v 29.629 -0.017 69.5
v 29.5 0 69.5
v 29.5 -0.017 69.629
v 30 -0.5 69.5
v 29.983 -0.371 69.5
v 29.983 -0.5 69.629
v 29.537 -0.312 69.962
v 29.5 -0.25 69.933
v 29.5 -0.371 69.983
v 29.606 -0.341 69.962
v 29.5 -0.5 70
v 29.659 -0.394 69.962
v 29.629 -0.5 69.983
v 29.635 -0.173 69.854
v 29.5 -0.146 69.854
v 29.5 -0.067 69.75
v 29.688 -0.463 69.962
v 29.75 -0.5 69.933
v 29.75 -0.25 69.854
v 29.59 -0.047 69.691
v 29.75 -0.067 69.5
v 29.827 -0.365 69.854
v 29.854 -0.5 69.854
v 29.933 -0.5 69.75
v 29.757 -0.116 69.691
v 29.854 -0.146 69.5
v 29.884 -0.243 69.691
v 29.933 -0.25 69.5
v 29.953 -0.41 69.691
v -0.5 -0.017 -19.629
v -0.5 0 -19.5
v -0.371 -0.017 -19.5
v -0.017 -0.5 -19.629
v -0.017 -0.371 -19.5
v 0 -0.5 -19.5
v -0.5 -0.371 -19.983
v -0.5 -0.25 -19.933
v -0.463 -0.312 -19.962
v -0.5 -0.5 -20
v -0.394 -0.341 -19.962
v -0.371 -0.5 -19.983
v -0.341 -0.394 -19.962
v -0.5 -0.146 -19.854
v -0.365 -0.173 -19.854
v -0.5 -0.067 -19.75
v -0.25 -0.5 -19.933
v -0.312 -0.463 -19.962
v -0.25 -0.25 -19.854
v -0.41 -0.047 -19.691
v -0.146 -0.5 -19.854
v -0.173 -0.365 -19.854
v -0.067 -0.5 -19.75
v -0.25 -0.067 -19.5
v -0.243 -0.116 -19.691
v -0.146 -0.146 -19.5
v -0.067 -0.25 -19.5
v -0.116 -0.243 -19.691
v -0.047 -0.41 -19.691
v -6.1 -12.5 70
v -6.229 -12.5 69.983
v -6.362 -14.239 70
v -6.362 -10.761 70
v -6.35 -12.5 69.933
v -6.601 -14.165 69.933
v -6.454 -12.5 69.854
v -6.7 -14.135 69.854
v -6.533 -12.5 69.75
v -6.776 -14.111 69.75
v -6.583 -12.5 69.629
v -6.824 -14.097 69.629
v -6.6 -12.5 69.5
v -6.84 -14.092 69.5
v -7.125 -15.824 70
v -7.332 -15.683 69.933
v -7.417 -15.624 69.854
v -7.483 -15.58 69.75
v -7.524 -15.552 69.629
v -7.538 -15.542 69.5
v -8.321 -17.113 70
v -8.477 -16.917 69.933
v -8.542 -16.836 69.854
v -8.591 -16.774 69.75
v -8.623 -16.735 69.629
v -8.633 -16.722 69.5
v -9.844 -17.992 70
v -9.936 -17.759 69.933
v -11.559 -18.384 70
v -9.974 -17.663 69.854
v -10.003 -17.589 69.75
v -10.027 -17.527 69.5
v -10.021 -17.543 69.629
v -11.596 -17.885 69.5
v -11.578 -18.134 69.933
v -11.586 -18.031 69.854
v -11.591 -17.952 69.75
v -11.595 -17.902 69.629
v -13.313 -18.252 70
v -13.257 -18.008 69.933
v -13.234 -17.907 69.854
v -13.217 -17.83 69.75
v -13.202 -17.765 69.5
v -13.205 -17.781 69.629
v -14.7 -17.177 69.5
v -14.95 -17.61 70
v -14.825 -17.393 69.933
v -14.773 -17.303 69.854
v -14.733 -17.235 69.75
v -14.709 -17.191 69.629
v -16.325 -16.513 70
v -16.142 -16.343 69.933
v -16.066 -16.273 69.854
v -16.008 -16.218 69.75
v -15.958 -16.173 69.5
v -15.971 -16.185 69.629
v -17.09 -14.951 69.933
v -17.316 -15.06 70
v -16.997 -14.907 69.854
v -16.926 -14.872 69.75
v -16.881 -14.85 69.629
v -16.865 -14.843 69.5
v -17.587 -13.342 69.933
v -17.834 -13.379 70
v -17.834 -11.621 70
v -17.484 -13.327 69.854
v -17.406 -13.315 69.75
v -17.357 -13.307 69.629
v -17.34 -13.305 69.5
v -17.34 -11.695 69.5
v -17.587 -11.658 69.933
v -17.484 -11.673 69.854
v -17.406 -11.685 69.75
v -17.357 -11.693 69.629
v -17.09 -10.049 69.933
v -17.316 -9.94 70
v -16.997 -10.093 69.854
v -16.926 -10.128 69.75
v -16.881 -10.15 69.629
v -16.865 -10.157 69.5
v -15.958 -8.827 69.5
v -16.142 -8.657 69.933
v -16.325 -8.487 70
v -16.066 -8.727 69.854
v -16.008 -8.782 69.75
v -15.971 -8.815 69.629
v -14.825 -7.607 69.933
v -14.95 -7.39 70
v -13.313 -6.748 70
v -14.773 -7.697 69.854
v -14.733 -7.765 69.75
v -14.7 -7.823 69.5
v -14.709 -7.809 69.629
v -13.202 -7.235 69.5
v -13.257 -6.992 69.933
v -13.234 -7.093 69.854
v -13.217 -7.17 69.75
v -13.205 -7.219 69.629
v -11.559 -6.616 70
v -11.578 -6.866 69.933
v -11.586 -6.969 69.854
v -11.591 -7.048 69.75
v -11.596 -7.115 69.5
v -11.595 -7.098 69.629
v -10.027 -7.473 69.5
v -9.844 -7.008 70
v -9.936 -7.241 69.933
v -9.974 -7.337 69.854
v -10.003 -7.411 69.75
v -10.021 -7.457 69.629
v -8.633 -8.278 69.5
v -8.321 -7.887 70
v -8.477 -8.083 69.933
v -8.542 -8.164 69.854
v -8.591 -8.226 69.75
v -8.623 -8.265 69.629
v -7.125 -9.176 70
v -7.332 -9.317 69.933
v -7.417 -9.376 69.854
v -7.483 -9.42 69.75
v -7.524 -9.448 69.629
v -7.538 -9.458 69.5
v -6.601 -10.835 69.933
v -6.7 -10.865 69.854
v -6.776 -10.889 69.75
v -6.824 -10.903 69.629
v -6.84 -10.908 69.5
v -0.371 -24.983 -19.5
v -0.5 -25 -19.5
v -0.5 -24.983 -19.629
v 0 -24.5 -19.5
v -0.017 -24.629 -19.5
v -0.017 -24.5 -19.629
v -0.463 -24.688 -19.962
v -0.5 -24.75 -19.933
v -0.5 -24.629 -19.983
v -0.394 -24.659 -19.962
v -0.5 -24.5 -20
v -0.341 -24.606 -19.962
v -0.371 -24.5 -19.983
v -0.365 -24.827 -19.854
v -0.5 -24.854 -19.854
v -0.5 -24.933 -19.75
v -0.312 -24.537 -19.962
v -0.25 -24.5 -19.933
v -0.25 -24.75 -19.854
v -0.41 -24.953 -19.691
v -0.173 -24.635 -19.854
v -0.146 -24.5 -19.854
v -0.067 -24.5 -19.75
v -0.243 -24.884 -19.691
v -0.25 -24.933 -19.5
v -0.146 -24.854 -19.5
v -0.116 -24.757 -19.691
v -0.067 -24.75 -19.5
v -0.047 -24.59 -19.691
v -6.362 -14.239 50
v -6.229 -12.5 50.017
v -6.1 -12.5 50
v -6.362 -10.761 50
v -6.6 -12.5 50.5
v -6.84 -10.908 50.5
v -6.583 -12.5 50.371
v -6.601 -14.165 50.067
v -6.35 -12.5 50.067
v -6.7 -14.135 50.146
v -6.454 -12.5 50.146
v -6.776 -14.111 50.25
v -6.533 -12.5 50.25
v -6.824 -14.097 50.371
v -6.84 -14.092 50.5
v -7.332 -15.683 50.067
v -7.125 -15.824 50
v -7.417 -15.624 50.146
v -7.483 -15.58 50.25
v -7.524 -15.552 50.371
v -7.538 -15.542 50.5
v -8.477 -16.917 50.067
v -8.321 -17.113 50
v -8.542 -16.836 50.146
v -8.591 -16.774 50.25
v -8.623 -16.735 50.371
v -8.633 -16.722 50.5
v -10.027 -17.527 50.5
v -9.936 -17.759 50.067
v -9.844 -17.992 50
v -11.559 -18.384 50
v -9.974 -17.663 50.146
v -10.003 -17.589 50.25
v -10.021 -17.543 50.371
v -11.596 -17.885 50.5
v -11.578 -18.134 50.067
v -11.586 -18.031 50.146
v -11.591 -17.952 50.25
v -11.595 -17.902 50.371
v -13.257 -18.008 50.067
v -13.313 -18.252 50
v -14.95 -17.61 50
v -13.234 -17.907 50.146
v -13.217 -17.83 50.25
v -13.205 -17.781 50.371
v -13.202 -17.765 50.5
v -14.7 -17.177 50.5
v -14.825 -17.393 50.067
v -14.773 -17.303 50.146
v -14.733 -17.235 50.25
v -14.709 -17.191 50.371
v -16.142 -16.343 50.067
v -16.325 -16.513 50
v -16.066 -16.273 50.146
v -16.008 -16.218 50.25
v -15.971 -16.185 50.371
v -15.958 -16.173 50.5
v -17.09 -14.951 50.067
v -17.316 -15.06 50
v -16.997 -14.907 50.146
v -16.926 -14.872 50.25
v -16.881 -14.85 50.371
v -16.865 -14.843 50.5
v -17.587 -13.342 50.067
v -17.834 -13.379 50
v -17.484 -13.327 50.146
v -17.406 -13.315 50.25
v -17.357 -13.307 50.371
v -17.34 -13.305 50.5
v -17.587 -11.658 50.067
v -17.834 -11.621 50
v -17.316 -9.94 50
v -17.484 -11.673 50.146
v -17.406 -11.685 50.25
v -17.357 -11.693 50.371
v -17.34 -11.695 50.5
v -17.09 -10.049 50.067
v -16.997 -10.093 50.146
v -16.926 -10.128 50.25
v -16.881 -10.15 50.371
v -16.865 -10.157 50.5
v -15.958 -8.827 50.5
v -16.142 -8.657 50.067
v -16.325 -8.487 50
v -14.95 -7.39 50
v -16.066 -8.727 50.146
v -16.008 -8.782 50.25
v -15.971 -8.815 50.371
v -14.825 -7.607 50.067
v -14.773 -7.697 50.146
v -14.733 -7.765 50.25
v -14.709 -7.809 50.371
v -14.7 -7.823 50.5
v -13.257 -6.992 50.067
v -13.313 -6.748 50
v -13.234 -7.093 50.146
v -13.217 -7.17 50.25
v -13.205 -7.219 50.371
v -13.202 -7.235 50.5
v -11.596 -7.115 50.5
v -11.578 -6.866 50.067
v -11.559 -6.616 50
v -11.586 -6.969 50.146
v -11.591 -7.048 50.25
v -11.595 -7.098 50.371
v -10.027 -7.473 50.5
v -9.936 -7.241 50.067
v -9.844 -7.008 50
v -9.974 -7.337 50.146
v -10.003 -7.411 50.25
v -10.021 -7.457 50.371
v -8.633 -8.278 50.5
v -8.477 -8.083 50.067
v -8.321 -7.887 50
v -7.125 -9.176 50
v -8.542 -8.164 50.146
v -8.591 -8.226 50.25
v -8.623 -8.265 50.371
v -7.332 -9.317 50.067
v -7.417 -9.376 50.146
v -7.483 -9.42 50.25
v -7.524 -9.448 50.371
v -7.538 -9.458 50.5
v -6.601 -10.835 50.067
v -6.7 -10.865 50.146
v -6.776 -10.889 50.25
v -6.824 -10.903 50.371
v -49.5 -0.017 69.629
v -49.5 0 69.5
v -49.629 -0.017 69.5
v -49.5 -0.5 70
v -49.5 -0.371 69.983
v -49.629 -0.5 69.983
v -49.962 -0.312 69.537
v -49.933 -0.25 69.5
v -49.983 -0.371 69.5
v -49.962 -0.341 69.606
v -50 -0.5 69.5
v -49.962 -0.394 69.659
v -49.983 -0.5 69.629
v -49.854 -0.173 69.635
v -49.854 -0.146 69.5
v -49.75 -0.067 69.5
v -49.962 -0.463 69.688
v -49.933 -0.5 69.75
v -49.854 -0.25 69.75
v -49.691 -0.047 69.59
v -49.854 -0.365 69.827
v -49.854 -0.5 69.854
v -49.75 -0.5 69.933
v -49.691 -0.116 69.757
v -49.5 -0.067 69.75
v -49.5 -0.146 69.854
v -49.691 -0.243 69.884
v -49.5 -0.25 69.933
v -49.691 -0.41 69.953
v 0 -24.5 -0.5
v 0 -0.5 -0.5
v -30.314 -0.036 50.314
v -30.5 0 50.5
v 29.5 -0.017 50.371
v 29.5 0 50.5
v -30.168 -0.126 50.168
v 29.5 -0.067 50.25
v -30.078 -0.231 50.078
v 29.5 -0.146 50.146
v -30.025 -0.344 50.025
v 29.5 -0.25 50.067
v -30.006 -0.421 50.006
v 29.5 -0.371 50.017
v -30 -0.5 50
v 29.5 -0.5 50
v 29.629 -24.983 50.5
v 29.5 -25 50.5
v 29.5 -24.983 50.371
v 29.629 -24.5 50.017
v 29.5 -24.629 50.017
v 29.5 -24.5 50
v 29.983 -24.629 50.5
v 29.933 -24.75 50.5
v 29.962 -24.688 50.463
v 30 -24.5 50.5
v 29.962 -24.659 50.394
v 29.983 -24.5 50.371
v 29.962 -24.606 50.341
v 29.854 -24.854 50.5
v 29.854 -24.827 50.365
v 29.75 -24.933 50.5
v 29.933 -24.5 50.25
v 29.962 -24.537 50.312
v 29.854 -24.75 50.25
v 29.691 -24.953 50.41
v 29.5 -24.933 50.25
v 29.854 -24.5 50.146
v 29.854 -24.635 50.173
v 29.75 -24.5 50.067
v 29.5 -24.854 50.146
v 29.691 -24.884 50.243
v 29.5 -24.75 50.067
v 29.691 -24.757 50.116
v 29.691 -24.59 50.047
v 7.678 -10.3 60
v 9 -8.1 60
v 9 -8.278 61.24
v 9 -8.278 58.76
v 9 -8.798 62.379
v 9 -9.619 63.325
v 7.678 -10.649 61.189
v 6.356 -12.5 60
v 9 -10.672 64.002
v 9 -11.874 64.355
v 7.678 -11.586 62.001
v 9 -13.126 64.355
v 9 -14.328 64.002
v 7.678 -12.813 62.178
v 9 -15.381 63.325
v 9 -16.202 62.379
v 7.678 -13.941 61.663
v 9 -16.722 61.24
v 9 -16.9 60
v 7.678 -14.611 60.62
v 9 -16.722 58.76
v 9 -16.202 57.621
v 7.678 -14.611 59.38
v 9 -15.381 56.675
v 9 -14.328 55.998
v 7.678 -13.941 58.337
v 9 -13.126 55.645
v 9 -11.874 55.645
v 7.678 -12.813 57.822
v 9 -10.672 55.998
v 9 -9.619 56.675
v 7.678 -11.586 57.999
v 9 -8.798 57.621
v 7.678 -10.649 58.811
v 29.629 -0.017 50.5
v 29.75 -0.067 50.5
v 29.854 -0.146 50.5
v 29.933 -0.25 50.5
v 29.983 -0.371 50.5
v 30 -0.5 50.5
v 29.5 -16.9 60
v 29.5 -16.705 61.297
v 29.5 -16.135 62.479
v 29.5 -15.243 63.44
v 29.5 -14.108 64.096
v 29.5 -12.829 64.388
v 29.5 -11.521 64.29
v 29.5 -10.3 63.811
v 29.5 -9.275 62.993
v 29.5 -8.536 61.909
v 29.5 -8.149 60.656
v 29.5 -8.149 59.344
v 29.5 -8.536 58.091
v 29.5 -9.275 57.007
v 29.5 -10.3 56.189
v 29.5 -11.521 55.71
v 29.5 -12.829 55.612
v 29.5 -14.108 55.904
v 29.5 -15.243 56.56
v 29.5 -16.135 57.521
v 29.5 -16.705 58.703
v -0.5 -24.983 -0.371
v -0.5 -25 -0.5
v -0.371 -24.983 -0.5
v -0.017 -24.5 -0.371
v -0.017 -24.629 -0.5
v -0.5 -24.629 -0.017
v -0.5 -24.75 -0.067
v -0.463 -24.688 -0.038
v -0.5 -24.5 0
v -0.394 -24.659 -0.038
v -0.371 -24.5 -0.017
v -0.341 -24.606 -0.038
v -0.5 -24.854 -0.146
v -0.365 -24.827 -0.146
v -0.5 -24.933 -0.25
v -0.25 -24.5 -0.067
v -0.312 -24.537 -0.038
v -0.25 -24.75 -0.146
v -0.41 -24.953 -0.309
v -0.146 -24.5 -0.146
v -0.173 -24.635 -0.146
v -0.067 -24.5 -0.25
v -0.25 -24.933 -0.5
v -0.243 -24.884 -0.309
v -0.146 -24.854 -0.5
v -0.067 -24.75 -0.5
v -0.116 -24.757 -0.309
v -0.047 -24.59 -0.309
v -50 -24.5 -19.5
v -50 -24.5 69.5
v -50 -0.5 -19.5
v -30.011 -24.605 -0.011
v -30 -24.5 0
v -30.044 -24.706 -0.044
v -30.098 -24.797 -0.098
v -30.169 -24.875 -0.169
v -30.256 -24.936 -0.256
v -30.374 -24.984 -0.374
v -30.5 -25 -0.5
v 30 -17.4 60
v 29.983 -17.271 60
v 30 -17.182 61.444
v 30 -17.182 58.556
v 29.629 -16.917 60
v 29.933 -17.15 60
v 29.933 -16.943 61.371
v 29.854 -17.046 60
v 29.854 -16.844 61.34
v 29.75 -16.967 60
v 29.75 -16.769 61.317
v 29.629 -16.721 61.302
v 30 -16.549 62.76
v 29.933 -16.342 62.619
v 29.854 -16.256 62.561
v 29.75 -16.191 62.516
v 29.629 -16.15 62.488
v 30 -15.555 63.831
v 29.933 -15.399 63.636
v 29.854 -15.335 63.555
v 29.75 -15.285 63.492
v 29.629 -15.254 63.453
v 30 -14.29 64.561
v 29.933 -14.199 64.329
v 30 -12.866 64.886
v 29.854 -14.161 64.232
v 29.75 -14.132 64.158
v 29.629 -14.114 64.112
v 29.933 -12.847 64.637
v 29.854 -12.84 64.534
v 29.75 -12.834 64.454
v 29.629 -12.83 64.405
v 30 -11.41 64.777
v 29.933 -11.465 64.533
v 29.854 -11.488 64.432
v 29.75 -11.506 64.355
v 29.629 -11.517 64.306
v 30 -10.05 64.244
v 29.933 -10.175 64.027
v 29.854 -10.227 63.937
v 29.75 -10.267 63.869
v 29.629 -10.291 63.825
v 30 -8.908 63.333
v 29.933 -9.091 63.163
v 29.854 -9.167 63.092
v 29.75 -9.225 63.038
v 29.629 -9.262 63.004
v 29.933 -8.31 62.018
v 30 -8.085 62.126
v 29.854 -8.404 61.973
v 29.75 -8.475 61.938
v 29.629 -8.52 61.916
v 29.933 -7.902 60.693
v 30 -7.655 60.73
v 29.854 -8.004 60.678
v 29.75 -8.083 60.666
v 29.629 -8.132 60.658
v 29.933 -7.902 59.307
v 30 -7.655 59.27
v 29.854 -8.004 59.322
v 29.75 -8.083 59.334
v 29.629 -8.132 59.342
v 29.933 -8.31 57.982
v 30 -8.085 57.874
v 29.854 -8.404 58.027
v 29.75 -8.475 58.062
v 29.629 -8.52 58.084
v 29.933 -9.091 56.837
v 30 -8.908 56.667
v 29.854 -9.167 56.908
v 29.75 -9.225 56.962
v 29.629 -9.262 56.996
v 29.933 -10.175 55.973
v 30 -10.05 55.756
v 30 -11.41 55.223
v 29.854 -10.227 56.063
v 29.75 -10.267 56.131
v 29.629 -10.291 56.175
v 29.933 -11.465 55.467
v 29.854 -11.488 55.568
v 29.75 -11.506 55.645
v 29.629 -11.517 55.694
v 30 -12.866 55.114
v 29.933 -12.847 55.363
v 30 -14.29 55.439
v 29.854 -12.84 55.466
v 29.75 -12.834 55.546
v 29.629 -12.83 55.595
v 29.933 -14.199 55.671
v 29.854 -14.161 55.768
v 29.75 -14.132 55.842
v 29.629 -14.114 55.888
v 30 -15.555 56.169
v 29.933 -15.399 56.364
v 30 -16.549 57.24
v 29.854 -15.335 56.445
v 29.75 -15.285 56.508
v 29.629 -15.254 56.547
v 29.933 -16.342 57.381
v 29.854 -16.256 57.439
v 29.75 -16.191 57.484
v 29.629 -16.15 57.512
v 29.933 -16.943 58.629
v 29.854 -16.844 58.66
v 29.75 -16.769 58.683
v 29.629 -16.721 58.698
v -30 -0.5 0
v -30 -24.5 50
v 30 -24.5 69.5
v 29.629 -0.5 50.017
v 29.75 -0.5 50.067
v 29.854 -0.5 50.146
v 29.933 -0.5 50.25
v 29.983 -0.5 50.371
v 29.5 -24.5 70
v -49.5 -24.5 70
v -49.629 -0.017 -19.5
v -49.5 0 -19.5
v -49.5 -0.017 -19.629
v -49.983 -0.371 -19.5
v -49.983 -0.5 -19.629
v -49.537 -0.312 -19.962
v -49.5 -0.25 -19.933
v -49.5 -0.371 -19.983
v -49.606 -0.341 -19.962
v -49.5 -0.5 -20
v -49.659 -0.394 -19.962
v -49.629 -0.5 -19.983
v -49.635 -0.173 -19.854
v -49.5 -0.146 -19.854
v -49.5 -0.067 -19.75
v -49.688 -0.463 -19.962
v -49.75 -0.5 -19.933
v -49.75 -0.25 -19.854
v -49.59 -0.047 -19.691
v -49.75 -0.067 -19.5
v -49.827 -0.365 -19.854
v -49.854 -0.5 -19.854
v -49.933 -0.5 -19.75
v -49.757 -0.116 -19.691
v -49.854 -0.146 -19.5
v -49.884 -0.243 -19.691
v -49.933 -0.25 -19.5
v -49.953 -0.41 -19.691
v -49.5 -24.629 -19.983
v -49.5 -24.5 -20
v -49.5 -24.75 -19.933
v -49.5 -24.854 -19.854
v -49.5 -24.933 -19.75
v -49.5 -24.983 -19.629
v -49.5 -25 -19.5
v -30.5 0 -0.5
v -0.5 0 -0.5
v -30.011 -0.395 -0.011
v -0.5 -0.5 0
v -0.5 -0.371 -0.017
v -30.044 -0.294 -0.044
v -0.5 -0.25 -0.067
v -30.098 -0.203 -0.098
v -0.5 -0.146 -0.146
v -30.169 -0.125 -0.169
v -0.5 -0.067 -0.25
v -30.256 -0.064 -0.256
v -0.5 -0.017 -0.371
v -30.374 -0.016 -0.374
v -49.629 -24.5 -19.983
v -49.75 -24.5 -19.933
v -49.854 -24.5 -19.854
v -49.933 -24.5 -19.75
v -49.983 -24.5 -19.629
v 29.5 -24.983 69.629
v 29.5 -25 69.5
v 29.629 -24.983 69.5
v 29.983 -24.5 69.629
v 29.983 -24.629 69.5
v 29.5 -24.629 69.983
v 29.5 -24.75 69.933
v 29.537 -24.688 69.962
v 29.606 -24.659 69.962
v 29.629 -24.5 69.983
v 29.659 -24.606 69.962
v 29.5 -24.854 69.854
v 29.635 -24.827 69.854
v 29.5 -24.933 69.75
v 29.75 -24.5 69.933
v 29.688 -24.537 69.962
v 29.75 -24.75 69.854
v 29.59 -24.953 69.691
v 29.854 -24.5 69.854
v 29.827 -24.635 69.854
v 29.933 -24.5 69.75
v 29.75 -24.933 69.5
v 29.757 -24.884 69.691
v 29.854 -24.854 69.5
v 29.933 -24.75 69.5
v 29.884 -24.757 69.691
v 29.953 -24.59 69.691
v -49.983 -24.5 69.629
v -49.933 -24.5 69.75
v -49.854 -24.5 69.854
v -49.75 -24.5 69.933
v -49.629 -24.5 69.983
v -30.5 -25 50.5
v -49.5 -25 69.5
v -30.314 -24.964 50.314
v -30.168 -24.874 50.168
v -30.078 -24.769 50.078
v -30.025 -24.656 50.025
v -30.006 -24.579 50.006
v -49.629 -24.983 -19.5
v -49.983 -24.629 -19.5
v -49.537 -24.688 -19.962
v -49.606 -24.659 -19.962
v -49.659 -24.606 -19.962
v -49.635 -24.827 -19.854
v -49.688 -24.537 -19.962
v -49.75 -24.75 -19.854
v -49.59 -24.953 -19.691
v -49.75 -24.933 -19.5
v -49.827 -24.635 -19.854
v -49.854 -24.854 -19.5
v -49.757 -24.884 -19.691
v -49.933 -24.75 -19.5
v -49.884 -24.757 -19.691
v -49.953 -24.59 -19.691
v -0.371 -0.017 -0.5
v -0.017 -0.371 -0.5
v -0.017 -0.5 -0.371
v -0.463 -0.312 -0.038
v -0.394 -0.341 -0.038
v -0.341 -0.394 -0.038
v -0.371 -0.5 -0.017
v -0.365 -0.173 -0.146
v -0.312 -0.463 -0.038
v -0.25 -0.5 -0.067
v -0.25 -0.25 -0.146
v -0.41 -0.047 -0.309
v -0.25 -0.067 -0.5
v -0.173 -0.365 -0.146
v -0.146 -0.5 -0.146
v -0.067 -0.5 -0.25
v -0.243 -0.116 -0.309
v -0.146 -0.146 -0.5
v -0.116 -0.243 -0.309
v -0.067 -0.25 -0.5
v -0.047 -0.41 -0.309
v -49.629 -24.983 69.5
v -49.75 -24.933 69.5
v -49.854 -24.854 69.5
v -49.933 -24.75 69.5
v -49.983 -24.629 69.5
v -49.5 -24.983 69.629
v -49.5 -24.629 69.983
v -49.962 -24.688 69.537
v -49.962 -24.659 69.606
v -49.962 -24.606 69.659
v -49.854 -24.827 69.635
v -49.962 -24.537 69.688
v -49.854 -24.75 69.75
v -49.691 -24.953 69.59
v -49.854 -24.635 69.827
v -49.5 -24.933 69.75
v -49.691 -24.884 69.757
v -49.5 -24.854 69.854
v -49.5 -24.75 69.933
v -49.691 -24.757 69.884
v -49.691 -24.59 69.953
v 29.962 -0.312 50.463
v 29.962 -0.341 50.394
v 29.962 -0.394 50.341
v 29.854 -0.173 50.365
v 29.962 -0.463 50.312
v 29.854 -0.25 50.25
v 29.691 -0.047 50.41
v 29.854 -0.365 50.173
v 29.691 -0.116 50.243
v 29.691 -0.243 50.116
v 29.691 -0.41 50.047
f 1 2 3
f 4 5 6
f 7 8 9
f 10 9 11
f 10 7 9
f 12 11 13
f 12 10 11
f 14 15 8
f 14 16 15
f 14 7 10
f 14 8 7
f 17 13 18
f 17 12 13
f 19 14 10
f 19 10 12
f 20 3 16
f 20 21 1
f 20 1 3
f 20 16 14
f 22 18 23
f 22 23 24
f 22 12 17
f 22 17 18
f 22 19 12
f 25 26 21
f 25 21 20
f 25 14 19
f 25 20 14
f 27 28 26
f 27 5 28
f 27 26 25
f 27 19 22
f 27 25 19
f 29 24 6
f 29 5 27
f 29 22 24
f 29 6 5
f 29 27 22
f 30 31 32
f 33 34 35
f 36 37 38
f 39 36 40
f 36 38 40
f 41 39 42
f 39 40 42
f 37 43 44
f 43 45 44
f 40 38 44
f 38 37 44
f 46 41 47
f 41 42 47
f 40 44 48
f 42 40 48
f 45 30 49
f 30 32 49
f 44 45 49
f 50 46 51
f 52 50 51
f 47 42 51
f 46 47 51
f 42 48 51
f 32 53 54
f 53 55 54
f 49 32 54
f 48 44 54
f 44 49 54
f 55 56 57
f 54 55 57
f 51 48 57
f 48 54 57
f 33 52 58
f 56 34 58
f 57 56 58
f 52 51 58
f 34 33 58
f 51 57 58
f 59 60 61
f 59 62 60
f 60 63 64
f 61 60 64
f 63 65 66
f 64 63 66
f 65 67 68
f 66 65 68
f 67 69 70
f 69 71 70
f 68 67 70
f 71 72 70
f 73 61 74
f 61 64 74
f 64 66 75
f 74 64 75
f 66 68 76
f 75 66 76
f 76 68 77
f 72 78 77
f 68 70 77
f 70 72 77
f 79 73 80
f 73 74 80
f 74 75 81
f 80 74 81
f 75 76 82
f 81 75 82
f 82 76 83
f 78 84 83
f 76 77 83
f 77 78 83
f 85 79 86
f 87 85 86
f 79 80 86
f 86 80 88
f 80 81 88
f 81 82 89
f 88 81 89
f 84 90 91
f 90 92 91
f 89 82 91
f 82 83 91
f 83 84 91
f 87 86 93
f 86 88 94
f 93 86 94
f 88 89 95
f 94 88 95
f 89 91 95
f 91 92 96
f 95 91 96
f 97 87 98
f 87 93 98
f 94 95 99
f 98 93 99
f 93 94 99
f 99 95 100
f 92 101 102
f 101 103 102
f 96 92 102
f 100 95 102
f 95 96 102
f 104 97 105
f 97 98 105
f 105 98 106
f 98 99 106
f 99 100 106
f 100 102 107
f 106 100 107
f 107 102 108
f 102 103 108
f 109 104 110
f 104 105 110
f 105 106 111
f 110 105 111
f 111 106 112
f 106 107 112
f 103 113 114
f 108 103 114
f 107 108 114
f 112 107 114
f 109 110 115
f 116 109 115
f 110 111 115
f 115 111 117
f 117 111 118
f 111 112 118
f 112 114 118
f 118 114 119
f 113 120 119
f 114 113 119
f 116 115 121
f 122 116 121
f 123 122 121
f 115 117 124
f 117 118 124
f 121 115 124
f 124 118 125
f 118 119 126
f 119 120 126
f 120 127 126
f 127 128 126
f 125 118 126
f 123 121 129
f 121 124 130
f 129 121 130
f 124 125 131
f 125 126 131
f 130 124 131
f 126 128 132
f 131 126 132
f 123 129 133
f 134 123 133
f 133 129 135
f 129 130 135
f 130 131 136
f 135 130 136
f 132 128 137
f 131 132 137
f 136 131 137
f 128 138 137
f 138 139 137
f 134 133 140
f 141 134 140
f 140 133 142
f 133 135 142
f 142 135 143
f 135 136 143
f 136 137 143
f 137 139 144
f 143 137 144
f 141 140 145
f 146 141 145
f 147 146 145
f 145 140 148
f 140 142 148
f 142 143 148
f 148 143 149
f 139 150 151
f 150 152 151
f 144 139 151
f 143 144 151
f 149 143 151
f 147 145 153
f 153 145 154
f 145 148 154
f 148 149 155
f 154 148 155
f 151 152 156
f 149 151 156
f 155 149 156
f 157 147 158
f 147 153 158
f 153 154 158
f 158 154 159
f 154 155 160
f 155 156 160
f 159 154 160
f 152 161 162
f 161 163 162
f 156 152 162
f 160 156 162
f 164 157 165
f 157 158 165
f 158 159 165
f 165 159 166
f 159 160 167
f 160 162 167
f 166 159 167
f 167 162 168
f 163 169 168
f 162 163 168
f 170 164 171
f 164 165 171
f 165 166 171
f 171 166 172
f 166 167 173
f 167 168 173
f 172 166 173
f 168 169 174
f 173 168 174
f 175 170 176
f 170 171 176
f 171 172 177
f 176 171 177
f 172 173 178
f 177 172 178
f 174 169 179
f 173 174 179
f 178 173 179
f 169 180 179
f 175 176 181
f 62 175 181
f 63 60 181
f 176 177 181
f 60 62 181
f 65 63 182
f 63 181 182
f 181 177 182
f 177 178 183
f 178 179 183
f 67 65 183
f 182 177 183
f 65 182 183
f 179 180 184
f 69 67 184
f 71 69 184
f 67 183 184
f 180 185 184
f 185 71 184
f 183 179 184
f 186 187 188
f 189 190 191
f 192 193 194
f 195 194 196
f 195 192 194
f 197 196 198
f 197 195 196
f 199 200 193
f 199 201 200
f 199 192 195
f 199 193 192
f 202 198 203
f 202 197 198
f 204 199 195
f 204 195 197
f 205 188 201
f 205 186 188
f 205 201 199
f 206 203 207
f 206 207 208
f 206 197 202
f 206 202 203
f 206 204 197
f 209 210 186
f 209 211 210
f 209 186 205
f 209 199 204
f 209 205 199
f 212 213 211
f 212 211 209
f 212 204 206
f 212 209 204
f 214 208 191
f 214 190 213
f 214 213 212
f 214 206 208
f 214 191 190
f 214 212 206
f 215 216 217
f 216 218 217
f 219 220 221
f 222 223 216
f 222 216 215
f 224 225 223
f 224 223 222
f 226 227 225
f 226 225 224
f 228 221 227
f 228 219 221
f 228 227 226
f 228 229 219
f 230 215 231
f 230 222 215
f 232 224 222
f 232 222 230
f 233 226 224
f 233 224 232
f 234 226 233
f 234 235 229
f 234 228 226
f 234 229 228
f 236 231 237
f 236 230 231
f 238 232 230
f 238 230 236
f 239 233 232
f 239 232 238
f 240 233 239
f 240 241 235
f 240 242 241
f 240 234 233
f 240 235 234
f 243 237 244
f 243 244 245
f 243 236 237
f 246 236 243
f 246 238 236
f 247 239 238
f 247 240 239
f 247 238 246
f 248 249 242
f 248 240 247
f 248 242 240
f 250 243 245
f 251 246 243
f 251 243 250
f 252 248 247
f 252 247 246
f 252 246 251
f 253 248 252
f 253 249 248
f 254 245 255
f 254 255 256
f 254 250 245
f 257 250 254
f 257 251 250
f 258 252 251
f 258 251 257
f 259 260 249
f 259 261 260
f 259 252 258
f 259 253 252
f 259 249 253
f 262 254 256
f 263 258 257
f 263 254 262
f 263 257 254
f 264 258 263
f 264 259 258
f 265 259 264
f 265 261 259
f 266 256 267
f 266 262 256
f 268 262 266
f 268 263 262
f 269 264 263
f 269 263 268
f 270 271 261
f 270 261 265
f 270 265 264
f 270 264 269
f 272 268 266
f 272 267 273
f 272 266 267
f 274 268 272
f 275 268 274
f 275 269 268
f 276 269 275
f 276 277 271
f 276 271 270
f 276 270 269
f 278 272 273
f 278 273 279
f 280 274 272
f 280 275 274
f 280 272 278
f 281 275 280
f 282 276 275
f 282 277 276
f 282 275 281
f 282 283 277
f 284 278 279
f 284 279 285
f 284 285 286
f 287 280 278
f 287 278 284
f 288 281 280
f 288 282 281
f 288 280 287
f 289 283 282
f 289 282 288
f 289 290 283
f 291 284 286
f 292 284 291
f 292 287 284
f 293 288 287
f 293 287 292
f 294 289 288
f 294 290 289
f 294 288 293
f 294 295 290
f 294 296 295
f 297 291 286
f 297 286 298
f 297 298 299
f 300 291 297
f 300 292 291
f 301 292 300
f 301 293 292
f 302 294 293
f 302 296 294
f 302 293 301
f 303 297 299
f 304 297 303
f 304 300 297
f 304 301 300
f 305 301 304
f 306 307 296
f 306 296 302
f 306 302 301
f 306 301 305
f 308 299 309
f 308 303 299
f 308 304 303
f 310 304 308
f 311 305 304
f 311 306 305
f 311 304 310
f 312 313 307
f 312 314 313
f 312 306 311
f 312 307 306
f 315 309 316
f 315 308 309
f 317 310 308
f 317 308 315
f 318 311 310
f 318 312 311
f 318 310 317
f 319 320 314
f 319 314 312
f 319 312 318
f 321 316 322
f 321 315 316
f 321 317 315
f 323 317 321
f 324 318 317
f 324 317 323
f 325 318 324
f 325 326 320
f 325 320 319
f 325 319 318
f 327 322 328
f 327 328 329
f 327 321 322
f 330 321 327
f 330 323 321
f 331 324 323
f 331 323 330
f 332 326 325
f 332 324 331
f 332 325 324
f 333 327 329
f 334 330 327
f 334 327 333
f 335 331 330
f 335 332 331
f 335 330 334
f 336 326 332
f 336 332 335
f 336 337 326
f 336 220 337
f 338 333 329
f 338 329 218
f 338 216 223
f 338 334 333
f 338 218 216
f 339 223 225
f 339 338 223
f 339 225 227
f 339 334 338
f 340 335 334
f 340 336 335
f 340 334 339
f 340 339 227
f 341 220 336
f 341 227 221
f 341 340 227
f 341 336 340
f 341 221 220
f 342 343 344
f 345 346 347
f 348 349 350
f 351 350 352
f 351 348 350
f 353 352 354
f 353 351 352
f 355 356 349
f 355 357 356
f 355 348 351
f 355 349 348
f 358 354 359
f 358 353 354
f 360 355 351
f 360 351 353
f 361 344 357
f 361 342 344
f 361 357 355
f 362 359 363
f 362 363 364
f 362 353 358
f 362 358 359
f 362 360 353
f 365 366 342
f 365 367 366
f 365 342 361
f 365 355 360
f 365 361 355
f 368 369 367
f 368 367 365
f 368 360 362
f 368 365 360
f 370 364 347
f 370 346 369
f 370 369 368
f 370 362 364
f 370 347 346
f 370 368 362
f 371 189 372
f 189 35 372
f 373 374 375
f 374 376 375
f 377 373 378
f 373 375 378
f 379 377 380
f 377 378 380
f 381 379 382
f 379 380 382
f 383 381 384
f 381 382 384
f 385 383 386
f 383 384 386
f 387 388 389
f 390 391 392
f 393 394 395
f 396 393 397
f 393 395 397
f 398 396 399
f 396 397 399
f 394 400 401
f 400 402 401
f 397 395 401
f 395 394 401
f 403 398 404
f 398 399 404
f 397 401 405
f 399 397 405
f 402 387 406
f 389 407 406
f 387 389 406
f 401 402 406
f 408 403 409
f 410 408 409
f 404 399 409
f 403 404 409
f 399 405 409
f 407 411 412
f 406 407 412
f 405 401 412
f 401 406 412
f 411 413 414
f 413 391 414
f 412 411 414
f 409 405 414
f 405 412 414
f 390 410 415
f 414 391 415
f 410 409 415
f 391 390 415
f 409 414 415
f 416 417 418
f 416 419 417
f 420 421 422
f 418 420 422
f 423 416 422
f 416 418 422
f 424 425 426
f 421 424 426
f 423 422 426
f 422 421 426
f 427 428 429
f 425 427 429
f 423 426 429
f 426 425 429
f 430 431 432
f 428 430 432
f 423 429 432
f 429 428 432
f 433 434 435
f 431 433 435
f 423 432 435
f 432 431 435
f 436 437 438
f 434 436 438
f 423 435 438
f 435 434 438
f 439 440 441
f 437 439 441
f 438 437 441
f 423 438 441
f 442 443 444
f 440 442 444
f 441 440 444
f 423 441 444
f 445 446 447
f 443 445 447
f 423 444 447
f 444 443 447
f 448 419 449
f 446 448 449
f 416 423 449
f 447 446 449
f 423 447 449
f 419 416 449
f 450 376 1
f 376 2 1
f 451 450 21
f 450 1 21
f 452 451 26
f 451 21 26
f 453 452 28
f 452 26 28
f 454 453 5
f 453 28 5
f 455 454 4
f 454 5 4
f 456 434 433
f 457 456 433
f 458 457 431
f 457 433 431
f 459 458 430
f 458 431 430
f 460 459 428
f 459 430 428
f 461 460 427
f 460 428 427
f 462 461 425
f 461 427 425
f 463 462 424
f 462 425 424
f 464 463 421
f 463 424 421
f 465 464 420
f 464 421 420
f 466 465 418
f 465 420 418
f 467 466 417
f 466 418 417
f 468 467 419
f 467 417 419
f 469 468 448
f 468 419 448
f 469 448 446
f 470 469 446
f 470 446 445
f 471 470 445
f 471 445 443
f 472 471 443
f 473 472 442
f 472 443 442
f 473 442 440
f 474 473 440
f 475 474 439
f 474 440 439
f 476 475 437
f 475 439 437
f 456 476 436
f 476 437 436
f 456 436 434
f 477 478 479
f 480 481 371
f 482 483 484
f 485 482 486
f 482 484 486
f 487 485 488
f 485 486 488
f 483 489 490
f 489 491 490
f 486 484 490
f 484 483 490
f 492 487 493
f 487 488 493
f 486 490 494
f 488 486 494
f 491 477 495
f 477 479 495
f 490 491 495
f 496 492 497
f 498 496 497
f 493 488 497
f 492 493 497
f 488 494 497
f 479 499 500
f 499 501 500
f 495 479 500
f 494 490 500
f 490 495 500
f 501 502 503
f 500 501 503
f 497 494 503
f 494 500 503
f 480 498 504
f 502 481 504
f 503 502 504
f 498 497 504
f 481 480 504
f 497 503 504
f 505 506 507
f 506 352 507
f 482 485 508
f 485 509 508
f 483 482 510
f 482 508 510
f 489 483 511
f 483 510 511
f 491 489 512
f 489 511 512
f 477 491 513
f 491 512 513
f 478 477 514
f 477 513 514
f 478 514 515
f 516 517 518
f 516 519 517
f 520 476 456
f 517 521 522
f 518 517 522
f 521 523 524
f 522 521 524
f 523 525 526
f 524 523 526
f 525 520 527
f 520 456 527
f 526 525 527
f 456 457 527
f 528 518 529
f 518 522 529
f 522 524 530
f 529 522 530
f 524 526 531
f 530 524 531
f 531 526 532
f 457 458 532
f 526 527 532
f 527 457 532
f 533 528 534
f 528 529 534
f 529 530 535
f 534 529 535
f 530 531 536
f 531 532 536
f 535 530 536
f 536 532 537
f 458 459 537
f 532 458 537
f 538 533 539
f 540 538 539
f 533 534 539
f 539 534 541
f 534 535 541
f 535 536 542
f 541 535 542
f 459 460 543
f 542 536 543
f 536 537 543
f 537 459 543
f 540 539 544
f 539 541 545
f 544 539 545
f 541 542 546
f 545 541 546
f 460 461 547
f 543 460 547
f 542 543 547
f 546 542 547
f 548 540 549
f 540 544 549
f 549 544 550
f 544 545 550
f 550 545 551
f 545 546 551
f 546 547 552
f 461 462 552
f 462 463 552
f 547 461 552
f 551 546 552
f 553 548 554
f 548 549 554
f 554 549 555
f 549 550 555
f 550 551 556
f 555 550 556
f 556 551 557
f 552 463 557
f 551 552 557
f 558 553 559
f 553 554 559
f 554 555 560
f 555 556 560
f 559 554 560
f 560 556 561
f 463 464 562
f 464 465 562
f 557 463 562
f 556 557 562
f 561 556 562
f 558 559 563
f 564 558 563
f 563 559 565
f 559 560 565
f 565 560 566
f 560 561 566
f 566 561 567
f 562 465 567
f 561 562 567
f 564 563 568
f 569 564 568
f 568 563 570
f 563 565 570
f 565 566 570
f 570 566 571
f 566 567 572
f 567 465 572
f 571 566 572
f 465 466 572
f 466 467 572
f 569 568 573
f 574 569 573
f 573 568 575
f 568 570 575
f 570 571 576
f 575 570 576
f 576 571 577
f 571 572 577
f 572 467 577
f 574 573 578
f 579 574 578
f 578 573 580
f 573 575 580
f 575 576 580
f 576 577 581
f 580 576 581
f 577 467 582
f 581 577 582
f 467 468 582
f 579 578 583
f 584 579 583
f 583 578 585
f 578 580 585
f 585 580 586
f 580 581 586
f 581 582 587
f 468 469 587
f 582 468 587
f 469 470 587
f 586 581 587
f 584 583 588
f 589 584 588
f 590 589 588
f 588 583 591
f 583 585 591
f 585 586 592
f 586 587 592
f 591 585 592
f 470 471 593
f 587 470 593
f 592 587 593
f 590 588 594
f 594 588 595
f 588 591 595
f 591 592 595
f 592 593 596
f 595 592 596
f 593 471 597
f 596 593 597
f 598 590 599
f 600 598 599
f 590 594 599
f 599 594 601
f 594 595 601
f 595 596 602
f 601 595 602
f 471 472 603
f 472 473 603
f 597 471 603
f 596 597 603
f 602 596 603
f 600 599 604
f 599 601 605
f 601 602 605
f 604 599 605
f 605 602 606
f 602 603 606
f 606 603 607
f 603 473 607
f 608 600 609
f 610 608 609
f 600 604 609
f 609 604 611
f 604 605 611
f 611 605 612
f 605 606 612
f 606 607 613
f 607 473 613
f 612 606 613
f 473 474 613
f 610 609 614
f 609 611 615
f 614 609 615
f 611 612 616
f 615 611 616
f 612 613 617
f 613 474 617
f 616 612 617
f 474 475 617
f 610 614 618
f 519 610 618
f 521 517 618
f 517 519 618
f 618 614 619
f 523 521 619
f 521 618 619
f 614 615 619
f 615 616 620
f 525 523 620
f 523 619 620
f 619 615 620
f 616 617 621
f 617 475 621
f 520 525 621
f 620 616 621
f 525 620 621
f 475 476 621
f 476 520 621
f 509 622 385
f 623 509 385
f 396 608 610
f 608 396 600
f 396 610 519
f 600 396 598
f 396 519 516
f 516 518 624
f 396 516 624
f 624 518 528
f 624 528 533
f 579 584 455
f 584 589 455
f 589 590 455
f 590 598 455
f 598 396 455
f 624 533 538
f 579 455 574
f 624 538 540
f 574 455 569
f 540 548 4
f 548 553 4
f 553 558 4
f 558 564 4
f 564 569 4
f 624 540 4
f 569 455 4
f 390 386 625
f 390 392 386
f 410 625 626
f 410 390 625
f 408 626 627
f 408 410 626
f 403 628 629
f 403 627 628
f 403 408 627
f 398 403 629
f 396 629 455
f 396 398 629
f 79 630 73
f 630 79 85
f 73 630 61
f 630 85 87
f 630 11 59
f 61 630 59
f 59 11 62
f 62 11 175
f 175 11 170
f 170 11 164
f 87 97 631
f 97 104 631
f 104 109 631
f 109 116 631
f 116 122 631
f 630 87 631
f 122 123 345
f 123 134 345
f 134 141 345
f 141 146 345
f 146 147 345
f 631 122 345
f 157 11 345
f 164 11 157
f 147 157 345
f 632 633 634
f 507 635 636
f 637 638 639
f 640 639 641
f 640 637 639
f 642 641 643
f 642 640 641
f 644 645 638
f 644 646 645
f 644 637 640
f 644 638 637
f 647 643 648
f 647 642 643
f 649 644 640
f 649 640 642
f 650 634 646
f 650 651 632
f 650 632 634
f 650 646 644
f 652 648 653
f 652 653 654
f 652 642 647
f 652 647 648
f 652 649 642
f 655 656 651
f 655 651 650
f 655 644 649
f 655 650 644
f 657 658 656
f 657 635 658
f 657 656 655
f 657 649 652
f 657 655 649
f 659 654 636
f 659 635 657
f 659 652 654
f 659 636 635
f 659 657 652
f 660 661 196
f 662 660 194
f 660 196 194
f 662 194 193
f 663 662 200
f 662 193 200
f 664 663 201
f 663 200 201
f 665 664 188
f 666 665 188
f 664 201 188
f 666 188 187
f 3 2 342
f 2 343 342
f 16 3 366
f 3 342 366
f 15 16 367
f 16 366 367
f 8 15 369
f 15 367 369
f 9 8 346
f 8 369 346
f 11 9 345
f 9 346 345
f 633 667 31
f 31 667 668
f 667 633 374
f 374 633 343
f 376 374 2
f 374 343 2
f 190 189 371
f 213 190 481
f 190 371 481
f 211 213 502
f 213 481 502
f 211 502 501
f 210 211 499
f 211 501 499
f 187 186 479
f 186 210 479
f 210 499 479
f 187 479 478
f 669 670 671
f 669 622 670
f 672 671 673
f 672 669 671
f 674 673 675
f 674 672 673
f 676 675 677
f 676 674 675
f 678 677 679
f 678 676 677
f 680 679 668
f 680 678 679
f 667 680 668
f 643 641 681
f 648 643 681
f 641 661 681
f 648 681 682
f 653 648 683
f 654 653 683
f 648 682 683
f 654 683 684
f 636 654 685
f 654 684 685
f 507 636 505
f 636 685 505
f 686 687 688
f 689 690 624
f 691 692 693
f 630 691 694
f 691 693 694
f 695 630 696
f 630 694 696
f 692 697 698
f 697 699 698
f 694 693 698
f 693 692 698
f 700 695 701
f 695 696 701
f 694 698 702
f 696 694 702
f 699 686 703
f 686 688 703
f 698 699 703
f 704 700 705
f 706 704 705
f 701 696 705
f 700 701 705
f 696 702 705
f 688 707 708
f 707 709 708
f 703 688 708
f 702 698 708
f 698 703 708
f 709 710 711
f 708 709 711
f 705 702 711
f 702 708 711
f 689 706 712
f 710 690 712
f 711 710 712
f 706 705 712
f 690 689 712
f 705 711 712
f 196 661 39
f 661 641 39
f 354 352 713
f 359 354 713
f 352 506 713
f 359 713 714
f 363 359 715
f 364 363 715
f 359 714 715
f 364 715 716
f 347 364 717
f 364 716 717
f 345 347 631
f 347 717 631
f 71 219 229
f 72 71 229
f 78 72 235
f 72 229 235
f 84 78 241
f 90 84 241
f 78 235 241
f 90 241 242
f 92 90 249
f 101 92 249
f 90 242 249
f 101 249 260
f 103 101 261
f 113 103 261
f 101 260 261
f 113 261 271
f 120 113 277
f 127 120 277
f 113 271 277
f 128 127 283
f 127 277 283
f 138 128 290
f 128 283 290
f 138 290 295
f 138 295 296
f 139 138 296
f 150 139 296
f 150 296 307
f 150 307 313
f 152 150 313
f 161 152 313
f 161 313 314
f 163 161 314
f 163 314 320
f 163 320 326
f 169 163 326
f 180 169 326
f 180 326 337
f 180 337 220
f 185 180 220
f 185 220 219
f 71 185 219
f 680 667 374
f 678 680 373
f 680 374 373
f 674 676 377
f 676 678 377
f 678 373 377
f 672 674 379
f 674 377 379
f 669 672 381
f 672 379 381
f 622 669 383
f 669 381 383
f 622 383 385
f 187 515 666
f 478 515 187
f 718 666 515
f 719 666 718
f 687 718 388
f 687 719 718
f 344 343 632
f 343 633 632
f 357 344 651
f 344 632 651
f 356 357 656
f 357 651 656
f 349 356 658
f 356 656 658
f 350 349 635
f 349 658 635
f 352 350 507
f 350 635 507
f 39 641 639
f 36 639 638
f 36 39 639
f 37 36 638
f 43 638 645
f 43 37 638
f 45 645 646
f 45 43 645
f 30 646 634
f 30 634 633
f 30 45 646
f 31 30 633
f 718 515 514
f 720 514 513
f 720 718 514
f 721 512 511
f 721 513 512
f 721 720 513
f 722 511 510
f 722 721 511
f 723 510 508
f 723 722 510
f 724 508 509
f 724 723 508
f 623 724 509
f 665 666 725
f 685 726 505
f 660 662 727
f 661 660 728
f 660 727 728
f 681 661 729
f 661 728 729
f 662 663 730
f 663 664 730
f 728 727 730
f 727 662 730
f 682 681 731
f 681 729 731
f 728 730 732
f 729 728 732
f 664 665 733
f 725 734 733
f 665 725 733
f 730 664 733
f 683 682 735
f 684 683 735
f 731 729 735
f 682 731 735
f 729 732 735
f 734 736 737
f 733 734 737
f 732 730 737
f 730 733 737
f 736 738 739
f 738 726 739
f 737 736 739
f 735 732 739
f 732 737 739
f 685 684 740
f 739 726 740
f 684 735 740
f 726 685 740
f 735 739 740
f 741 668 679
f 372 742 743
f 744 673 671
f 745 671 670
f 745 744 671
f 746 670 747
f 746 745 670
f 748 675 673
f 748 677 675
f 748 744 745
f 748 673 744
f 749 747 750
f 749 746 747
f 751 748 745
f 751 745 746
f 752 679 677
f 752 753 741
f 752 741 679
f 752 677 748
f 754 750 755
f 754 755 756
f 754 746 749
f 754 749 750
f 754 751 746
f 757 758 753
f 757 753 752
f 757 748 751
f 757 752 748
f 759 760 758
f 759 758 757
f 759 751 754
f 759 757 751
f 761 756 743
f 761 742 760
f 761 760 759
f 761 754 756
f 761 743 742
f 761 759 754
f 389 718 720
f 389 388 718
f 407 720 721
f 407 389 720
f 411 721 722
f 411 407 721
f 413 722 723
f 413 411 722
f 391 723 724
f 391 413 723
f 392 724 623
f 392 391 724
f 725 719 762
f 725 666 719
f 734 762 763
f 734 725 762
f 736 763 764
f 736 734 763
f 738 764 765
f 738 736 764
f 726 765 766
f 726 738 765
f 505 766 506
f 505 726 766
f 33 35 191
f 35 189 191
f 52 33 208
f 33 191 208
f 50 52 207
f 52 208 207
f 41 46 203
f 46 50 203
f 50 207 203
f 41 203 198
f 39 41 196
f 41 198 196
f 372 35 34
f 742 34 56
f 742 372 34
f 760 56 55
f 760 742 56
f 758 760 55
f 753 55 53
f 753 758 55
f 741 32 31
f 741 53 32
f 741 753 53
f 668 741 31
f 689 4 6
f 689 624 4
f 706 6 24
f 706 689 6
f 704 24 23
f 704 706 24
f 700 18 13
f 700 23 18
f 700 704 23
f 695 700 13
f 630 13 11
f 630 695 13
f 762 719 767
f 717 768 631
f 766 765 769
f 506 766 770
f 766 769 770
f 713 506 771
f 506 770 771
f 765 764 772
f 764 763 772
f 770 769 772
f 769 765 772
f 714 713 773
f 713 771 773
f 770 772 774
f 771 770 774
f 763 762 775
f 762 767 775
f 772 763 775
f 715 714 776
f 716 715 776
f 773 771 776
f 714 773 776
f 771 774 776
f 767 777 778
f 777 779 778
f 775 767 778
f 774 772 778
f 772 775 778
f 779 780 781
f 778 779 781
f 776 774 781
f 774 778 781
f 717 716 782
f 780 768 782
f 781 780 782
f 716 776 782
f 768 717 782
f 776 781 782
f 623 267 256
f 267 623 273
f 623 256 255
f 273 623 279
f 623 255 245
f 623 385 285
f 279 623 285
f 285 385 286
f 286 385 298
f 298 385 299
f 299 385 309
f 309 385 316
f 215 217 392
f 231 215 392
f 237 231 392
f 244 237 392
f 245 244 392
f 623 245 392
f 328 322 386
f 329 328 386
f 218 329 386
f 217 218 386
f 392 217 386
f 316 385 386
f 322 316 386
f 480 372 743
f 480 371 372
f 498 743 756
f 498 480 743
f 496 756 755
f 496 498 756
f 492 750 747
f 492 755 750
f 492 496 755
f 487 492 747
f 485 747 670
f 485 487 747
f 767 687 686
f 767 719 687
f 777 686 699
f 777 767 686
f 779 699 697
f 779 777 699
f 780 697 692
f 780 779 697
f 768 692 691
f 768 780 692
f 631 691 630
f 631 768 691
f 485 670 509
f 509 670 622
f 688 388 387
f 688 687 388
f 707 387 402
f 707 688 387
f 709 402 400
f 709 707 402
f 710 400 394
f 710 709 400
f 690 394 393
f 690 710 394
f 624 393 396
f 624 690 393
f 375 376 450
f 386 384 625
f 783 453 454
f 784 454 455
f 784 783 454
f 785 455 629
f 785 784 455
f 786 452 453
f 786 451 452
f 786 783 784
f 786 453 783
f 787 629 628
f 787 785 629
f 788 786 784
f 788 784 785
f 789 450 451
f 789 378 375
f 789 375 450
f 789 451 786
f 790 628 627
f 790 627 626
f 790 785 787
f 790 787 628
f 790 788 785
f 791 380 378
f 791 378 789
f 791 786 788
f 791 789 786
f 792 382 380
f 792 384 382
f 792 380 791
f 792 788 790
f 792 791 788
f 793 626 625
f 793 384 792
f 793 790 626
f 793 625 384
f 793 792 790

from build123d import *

# Parameters (mm, degrees)
F1_DEPTH = 25
F3_D     = 10.8
F3_DEPTH = 21
F3_TIP   = 3.2446473427
F5_D     = 8.8
F5_DEPTH = 21
F5_TIP   = 2.6437867237
F6_R     = 0.5


with BuildPart() as f1:
    # F0 (on Front) → F1 (new body)
    with BuildSketch(Plane.XZ):
        Polygon((0, -20), (0, 0), (-30, 0), (-30, 50), (30, 50), (30, 70), (-50, 70), (-50, -20), align=None)
    extrude(amount=F1_DEPTH)

    # F3 (one way)
    with BuildSketch(Plane(origin=(0, 0, 50), x_dir=(1, 0, 0), z_dir=(0, 0, -1))):
        with Locations((-12, 12.5)):
            Circle(F3_D / 2)
    extrude(amount=-F3_DEPTH, mode=Mode.SUBTRACT)
    with Locations(Plane(origin=(0, 0, 50), x_dir=(1, 0, 0), z_dir=(0, 0, -1))):
        with Locations((-12, 12.5)):
            with Locations((0, 0, -(F3_DEPTH + F3_TIP / 2))):  # 118° drill point
                Cone(0, F3_D / 2, F3_TIP, mode=Mode.SUBTRACT)

    # F5
    with Locations(Plane.YZ.offset(30)):
        with Locations((-12.5, 60)):
            Hole(F5_D / 2, depth=F5_DEPTH)
            with Locations((0, 0, -(F5_DEPTH + F5_TIP / 2))):  # 118° drill point
                Cone(0, F5_D / 2, F5_TIP, mode=Mode.SUBTRACT)

    # F6
    f6_edges = [f1.edges().sort_by_distance(p)[0] for p in [
        (0, -25, -10),
        (-15, -25, 0),
        (-30, -25, 25),
        (0, -25, 50),
        (30, -25, 60),
        (-10, -25, 70),
        (-50, -25, 25),
        (-25, -25, -20),
        (0, 0, -10),
        (-15, 0, 0),
        (-30, 0, 25),
        (0, 0, 50),
        (30, 0, 60),
        (-10, 0, 70),
        (-50, 0, 25),
        (-25, 0, -20),
        (30, -12.5, 70),
        (30, -12.5, 50),
        (0, -12.5, -20),
        (0, -12.5, 0),
        (-50, -12.5, -20),
        (-50, -12.5, 70),
        (-17.4, -12.5, 50),
        (30, -16.9, 60),
        (-17.4, -12.5, 70),
    ]]
    fillet(f6_edges, radius=F6_R)


solid = f1.part
